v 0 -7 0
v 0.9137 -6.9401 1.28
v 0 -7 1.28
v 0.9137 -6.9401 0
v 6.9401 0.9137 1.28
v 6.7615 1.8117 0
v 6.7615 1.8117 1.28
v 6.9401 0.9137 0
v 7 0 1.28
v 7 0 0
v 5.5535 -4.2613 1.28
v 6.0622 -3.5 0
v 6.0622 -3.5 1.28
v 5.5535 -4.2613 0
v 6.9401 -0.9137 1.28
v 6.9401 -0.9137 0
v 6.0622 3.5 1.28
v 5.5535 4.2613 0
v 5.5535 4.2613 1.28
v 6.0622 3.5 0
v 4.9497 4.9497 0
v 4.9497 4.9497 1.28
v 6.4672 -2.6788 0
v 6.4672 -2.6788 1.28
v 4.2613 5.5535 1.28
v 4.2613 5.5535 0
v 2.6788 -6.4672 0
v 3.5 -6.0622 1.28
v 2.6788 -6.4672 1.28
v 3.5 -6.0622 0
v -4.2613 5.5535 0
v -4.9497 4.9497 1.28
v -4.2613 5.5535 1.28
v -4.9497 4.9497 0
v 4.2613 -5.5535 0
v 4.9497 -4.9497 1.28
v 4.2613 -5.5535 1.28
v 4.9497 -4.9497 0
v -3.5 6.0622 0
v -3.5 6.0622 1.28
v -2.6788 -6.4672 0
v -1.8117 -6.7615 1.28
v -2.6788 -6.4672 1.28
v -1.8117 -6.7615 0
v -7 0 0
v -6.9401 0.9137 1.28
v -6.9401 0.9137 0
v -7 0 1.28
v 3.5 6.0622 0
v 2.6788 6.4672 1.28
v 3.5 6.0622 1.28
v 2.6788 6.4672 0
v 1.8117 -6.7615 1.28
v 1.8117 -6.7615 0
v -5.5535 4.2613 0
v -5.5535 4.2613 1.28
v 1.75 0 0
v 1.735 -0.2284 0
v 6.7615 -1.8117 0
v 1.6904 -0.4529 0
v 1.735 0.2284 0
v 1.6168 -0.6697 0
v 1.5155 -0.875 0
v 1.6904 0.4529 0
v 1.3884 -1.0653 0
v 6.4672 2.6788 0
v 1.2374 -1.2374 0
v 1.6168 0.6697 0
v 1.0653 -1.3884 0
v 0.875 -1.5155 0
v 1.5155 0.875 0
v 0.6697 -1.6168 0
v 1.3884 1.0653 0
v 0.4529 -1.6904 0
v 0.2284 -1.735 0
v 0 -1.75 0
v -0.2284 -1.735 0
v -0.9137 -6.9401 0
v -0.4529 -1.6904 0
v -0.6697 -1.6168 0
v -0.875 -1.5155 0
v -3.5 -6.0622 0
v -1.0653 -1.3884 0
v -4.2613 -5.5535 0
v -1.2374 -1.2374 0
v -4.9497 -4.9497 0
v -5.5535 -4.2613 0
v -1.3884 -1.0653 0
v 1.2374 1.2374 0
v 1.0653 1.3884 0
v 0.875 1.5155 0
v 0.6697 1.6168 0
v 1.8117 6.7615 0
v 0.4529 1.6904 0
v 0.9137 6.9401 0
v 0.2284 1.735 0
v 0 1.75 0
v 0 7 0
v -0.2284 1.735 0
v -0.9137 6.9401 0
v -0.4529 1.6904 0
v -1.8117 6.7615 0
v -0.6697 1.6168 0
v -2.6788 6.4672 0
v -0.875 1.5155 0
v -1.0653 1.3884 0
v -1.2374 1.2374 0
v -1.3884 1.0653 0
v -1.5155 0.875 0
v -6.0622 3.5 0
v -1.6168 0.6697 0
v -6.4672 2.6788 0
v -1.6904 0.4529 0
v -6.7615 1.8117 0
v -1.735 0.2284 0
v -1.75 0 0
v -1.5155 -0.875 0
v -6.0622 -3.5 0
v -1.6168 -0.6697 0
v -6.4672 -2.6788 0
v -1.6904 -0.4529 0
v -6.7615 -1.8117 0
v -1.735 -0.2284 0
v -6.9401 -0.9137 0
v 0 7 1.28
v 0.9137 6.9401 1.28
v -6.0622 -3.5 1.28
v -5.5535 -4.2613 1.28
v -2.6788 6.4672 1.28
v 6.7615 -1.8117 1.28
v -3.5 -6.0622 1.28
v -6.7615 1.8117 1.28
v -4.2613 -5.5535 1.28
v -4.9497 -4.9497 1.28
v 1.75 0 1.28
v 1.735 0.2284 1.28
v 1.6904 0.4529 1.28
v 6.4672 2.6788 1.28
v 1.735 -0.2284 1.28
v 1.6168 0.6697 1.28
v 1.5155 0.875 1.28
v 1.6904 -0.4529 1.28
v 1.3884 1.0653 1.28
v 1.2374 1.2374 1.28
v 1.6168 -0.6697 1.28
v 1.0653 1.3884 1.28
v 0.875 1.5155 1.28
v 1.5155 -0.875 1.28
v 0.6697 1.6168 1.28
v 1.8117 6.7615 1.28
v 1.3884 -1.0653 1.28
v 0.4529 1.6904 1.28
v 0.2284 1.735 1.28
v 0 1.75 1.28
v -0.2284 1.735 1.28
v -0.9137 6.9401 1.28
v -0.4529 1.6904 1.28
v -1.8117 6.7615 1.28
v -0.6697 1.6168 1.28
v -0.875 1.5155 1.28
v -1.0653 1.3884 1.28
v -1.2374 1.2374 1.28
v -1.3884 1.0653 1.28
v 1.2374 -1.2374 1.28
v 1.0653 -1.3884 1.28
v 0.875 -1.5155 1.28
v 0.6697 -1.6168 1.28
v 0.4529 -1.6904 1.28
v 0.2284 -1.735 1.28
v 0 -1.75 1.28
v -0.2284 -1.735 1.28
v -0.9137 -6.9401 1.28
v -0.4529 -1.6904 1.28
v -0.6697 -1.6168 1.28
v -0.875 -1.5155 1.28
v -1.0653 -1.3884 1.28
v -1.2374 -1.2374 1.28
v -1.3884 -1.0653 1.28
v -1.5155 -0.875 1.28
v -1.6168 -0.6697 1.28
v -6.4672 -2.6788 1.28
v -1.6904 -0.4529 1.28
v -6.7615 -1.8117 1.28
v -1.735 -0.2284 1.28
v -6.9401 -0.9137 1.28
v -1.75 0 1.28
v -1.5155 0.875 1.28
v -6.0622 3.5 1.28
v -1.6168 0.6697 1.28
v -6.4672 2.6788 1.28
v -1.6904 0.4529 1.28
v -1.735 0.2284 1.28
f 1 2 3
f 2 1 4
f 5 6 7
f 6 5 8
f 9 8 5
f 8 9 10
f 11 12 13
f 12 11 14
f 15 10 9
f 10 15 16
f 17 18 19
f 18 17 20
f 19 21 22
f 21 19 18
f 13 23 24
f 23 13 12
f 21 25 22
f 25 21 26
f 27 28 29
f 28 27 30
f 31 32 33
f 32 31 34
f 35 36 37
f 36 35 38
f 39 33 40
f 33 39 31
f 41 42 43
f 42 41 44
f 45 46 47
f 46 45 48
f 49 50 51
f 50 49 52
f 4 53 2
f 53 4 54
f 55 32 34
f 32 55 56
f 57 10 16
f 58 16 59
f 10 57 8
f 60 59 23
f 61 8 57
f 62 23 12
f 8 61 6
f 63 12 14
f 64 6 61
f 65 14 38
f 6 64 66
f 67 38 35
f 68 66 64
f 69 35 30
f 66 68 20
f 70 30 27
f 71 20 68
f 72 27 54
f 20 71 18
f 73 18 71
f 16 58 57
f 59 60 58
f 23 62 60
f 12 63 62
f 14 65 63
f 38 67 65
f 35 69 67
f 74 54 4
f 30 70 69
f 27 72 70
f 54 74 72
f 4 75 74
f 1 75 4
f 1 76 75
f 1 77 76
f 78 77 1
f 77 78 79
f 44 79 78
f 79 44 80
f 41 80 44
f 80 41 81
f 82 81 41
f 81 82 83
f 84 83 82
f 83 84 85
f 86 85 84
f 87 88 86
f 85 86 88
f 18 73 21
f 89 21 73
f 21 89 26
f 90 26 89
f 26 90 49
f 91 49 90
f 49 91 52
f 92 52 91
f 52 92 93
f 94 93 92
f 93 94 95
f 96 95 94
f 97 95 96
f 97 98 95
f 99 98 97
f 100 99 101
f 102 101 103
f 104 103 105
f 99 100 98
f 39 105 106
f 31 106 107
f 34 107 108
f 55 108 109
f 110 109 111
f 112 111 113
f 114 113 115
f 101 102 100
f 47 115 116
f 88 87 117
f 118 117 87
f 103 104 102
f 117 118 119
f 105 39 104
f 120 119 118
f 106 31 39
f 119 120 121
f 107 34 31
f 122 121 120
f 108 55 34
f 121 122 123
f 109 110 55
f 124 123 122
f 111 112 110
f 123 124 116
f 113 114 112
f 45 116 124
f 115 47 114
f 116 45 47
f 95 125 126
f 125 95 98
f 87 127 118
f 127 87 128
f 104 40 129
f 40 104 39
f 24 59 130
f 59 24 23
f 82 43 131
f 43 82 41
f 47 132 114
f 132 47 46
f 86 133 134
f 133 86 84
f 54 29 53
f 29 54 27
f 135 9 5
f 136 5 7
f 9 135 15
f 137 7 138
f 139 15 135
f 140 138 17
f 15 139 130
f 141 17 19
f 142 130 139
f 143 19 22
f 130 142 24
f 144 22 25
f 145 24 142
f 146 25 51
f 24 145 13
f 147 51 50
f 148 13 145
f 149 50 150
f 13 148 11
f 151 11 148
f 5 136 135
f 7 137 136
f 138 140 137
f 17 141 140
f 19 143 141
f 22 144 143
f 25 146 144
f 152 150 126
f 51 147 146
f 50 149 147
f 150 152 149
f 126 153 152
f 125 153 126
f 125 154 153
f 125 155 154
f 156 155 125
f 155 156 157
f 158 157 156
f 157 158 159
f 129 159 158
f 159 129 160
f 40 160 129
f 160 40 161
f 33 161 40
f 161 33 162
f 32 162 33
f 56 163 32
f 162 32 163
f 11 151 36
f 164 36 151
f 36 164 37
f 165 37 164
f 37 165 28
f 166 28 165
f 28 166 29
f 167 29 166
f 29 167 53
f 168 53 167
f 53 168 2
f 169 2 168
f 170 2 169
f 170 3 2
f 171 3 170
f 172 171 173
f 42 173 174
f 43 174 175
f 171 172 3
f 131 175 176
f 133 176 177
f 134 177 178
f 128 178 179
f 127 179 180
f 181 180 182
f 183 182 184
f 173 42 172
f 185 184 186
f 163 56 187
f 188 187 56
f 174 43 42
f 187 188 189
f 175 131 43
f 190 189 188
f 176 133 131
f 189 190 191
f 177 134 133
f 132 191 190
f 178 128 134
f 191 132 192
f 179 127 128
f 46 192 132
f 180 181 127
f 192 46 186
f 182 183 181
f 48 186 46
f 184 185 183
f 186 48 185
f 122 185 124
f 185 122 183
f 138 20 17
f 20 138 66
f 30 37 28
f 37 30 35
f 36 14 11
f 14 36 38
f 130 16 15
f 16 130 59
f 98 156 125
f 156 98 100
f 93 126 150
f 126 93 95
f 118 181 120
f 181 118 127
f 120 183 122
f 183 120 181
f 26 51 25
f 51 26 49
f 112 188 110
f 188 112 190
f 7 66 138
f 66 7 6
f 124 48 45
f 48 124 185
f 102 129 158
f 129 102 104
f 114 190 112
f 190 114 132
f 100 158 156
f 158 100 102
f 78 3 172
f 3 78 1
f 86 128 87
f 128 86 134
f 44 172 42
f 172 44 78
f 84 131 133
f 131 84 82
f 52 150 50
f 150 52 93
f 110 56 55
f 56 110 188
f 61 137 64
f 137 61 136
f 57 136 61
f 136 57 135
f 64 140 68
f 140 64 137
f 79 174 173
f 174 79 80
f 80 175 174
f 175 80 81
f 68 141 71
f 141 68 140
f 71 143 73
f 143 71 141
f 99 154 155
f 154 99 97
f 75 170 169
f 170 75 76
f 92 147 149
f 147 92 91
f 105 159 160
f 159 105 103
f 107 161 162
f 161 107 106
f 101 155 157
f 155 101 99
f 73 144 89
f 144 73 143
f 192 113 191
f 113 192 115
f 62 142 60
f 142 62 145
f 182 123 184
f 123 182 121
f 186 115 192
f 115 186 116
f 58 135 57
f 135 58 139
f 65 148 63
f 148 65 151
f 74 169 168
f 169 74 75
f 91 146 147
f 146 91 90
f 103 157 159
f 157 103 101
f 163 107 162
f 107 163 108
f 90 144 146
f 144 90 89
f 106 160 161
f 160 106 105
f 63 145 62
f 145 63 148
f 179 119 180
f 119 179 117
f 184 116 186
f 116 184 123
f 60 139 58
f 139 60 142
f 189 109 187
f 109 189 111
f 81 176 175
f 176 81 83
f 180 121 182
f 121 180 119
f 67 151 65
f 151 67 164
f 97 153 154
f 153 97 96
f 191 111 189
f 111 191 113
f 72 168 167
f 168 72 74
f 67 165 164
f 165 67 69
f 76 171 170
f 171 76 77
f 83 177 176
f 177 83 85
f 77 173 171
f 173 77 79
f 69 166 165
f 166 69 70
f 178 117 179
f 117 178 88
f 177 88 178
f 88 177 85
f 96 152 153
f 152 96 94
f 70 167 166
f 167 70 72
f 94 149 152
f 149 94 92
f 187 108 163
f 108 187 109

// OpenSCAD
// file: parameters.scad
// =============================================================================
// Gen-Y Dual-rotor MICRO-GAP copper-window AFPM — WOUND-AWARE (HARD GATE)
// PRIMARY challenger vs Gen-V. Thinner m2m + larger copper window + 150 t.
// =============================================================================

// --- Wire / wind budget (26 AWG, ~1 lb spool ≈ 390 m bare-equiv) --------------
wire_awg            = 26;
wire_od             = 0.45;     // insulated OD mm
turns               = 150;      // +10 vs Gen-V
fill                = 0.70;
layers_per_face     = 2;        // axial layers proud of EACH flange
wind_build_axial    = layers_per_face * wire_od * fill;   // 0.63 mm
wind_build_radial   = 3 * wire_od * fill;                 // 0.945 mm

// --- Pancake former (bare STL) — thinner web/flange than Gen-V ---------------
coil_id_r           = 21.0;     // larger copper window vs Gen-V 23–58
coil_od_r           = 60.0;
span_deg            = 26.0;     // 12 stations × 30° pitch
former_web          = 1.8;
flange_t            = 0.70;
wall                = 1.2;
slot_w              = 2.4;
mount_hole          = 3.5;
tab_len             = 7.0;

former_bare_h       = former_web + 2 * flange_t;            // 3.2 mm
coil_envelope_h     = former_bare_h + 2 * wind_build_axial; // 4.46 mm

// --- Running clearance (magnet face → WOUND face) EACH side ------------------
run_clear           = 0.65;     // PASS ≥ 0.5 (prefer ≥0.65)
gap_spacer_h        = run_clear + wind_build_axial;         // 1.28 mm
m2m                 = coil_envelope_h + 2 * run_clear;      // 5.76 mm (beats Gen-V 6.16)

// --- Mid stator (12 pancakes 3φ; winds proud both faces) ---------------------
coil_stations       = 12;
bay_r_in            = coil_id_r - 2.0 - wind_build_radial;
bay_r_out           = coil_od_r + 2.0 + wind_build_radial;
bay_span            = span_deg + 4.0;
bay_offset          = 2.0;
stator_thick        = former_bare_h;                        // winds proud ±Z
stator_od           = 156.0;
shaft_clear_stator  = 36.0;
coil_mount_r        = 28.0;

// --- Rotors (×2) — 8×Ø20 + 24×Ø5 Halbach each face ---------------------------
large_pocket_d      = 20.3;
small_pocket_d      = 5.3;
pocket_h            = 5.2;
large_n             = 8;
R_large             = 52.0;
R_small_inner       = 40.0;
R_small_mid         = 52.0;
R_small_outer       = 64.0;
carrier_od          = 152.0;
carrier_thick       = 7.5;
hub_h               = 10.0;
hub_od              = 30.0;
rotor_b_offset_deg  = 22.5;

// --- Modular MAX interface (Gen-E family) ------------------------------------
shaft_bore          = 8.35;
bearing_d           = 21.85;
bearing_h           = 7.2;
m3_clear            = 3.5;
bolt_r_inner        = 36.0;
bolt_n_inner        = 6;
flange_bolt_r       = 72.0;
flange_bolt_n       = 6;
brace_r             = 68.0;
brace_d             = 4.3;
brace_n             = 4;

spacer_pad_od       = 14.0;
spacer_pad_id       = m3_clear;
endbell_od          = 156.0;
endbell_thick       = 8.0;
endbell_shaft_clear = 10.0;

$fn = 64;
// main file
// Gen-Y gap spacer — h = run_clear + wind_build_axial; print ×12
include <parameters.scad>;
$fn = 48;
difference() {
    cylinder(d=spacer_pad_od, h=gap_spacer_h);
    translate([0, 0, -0.1]) cylinder(d=spacer_pad_id, h=gap_spacer_h + 0.2);
}
